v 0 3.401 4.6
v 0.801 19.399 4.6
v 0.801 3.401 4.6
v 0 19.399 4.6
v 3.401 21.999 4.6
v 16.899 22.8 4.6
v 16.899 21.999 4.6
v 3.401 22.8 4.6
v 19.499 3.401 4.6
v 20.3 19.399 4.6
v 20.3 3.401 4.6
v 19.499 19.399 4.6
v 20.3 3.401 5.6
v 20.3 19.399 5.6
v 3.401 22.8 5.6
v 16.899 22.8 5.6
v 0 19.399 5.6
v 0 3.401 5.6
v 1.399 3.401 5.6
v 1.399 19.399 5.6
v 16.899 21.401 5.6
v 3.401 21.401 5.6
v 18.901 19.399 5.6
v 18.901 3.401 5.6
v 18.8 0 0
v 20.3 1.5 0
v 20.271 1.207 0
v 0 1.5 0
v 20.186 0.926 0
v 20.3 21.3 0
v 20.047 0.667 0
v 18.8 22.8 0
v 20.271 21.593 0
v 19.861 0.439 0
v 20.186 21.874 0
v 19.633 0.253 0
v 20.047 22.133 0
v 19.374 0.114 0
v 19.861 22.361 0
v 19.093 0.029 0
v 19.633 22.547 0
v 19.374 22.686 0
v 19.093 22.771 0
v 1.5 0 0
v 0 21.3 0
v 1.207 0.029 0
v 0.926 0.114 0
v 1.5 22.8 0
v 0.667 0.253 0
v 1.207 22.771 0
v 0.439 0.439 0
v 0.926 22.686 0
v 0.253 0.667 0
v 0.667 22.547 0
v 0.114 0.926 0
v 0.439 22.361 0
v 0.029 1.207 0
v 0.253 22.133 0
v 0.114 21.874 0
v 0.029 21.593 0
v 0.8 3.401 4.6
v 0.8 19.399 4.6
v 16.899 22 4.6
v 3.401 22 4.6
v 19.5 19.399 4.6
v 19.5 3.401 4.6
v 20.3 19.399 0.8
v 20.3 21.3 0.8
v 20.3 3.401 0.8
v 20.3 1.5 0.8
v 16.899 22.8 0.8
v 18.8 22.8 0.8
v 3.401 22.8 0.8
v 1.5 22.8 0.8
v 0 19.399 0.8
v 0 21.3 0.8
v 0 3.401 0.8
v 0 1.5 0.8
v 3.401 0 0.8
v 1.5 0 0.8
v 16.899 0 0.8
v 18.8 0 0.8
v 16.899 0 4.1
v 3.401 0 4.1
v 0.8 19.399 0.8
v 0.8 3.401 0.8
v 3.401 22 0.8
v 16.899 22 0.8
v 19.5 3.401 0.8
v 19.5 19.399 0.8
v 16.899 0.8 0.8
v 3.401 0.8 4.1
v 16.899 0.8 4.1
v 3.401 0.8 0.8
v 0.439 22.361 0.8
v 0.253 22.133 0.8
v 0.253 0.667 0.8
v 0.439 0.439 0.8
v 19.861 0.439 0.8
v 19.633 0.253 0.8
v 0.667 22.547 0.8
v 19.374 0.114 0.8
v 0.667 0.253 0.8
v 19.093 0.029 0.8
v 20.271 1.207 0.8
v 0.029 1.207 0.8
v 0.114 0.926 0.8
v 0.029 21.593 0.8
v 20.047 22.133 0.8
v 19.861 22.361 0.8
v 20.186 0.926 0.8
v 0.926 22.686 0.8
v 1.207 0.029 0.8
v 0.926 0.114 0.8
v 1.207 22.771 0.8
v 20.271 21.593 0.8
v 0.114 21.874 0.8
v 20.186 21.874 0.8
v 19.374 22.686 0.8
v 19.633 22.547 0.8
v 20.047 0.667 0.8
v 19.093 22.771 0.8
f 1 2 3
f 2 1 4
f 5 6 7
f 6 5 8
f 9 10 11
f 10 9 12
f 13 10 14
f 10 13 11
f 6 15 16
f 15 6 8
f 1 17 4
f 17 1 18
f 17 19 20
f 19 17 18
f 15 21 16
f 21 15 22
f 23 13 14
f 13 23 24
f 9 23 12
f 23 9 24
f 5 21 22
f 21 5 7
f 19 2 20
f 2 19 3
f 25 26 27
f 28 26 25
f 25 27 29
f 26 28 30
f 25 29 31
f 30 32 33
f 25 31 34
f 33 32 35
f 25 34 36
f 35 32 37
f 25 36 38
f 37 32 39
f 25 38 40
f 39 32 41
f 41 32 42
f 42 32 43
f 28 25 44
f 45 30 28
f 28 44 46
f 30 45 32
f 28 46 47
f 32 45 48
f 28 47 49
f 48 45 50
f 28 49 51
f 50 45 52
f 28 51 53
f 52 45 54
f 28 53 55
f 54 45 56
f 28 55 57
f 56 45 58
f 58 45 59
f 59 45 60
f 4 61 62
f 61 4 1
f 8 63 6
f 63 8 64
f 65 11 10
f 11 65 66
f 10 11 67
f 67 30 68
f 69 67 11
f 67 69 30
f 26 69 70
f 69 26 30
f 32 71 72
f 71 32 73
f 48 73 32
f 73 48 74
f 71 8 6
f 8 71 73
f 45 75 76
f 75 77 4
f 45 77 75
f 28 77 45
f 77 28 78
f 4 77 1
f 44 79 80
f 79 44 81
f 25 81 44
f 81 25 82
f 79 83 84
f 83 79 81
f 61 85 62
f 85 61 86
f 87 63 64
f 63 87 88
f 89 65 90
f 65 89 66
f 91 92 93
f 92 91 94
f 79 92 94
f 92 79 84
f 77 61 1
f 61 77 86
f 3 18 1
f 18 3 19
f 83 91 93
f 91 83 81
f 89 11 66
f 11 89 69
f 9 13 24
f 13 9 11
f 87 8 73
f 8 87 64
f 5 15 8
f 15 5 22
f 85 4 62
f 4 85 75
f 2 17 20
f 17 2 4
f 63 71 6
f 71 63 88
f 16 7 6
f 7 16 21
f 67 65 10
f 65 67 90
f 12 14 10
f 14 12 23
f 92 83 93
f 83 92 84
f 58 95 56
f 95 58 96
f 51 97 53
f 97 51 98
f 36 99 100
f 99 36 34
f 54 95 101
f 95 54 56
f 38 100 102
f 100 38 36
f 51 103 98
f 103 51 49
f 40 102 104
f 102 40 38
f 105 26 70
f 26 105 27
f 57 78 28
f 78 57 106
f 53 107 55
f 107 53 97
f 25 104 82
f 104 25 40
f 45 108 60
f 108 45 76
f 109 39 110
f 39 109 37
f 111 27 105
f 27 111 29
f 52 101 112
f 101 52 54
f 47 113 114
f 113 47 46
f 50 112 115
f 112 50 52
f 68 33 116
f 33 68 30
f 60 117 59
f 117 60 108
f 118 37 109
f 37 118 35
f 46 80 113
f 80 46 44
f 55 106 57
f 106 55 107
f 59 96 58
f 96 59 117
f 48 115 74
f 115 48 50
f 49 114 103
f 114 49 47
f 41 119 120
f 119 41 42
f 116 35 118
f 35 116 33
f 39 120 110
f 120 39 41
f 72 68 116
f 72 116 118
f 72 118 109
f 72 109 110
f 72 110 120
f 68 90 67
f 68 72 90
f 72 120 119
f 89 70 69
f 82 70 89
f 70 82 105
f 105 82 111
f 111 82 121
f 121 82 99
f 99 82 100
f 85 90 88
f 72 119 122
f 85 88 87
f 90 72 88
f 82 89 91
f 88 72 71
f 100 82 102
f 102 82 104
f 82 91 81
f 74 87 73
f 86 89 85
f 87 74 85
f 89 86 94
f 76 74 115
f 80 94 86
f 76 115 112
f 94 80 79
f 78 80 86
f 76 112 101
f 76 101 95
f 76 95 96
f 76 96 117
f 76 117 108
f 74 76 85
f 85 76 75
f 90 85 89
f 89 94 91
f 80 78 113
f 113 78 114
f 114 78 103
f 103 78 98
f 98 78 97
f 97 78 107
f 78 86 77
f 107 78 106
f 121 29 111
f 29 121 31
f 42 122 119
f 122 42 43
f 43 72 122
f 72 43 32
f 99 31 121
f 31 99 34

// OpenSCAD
EPSILON = 0.001;

BLE_NANO_WIDTH = 18.5;
BLE_NANO_DEPTH = 21;
BLE_NANO_PCB_HEIGHT = 1;
PCB_CORNER_RADIUS = 1.5;

FRONT_COMPONENTS_HEIGHT = 1;
BACK_COMPONENTS_HEIGHT = 3;

HOLDER_WALL_THICKNESS = 0.8;
BLE_NANO_MARGIN = 0.1;

function BleNano_width() = BLE_NANO_WIDTH;
function BleNano_depth() = BLE_NANO_DEPTH;
function BleNano_holderWidth() = BLE_NANO_WIDTH + 2 * (HOLDER_WALL_THICKNESS + BLE_NANO_MARGIN);
function BleNano_holderDepth() = BLE_NANO_DEPTH + 2 * (HOLDER_WALL_THICKNESS + BLE_NANO_MARGIN);

/**
 * BLE nano microcontroller.
 *
 * @param positiveShape
 *     if true, draw only the positive part.
 *     if false, draw only the negative part.
 */
module BleNano(baseThickness = 0.8, positiveShape = true) {
    // Base
    baseX = HOLDER_WALL_THICKNESS + BLE_NANO_MARGIN;
    baseY = HOLDER_WALL_THICKNESS + BLE_NANO_MARGIN;
    if (positiveShape) {
        translate([baseX, baseY, BACK_COMPONENTS_HEIGHT + baseThickness])
            linear_extrude(height = BLE_NANO_PCB_HEIGHT)
                offset(r = PCB_CORNER_RADIUS, $fn = 32)
                    offset(r = -PCB_CORNER_RADIUS, $fn = 32)
                        square([BLE_NANO_WIDTH, BLE_NANO_DEPTH]);
    }
    
    // Front components
    if (positiveShape) {
        width = 15;
        depth = 11.5;
        translate([baseX - (width - BLE_NANO_WIDTH) / 2,
                   baseY + 3,
                   BACK_COMPONENTS_HEIGHT + BLE_NANO_PCB_HEIGHT + baseThickness])
            cube([width, depth, FRONT_COMPONENTS_HEIGHT]);
    }
    
    // Back components
    if (positiveShape) {
        width = 15;
        depth = 17.25;
        translate([baseX - (width - BLE_NANO_WIDTH) / 2, baseY + 1, baseThickness])
            cube([width, depth, BACK_COMPONENTS_HEIGHT]);
    }
}

/**
 * BLE nano holder.
 *
 * @param positiveShape
 *     if true, draw only the positive part.
 *     if false, draw only the negative part.
 */
module BleNano_holder(baseThickness = 0.8, positiveShape = true) {
    // Base
    baseWidth = BleNano_holderWidth();
    baseDepth = BleNano_holderDepth();
    if (positiveShape) {
        linear_extrude(height = baseThickness)
            offset(r = PCB_CORNER_RADIUS, $fn = 32)
                offset(r = -PCB_CORNER_RADIUS, $fn = 32)
                    square([baseWidth, baseDepth]);
    }
    
    // Supports
    if (positiveShape) {
        wallHeight = baseThickness + BACK_COMPONENTS_HEIGHT + baseThickness;
        horizontalTopSupportHeight = 1;
        horizontalTopSupportWidth = 0.6;
        innerClearanceWidth = BLE_NANO_WIDTH + 2 * BLE_NANO_MARGIN;
        innerClearanceDepth = BLE_NANO_DEPTH + 2 * BLE_NANO_MARGIN;
        
        difference() {
            union() {
                // Contour around the BLE Nano
                linear_extrude(height = wallHeight)
                    difference() {
                        offset(r = PCB_CORNER_RADIUS, $fn = 32)
                            offset(r = -PCB_CORNER_RADIUS, $fn = 32)
                                square([baseWidth, baseDepth]);
                
                        translate([HOLDER_WALL_THICKNESS, HOLDER_WALL_THICKNESS])
                            offset(r = PCB_CORNER_RADIUS, $fn = 32)
                                offset(r = -PCB_CORNER_RADIUS, $fn = 32)
                                    square([innerClearanceWidth, innerClearanceDepth]);
                    }
                    
                // Horizontal supports on top of the BLE Nano
                translate([0, 0, wallHeight])
                    difference() {
                        linear_extrude(height = horizontalTopSupportHeight)
                            offset(r = PCB_CORNER_RADIUS, $fn = 32)
                                offset(r = -PCB_CORNER_RADIUS, $fn = 32)
                                    square([baseWidth, baseDepth]);
                
                        scale = [(innerClearanceWidth - 2 * horizontalTopSupportWidth) / 
                                 innerClearanceWidth,
                                 (innerClearanceDepth - 2 * horizontalTopSupportWidth) / 
                                 innerClearanceDepth];
                        translate([HOLDER_WALL_THICKNESS, HOLDER_WALL_THICKNESS, -EPSILON])
                            translate([innerClearanceWidth / 2, innerClearanceDepth / 2])
                                linear_extrude(height = horizontalTopSupportHeight + 2 * EPSILON,
                                               scale = scale)
                                    translate([-innerClearanceWidth / 2, -innerClearanceDepth / 2])
                                        offset(r = PCB_CORNER_RADIUS, $fn = 32)
                                            offset(r = -PCB_CORNER_RADIUS, $fn = 32)
                                                square([innerClearanceWidth, innerClearanceDepth]);
                    }
            }
            
            // Remove the support corners
            cornerSize = HOLDER_WALL_THICKNESS + horizontalTopSupportWidth + 2 + 2 * EPSILON;
            cornerheight = wallHeight + horizontalTopSupportHeight + EPSILON;
            for (y = [-EPSILON, baseDepth - cornerSize + EPSILON])
                for (x = [-EPSILON, baseWidth - cornerSize + EPSILON])
                    translate([x, y, 0])
                        cube([cornerSize, cornerSize, cornerheight]);
            
            // Clearance for the surface pins
            translate([-EPSILON, -EPSILON, wallHeight - 0.5])
                cube([baseWidth + 2 * EPSILON,
                      HOLDER_WALL_THICKNESS + horizontalTopSupportWidth + 2 * EPSILON,
                      horizontalTopSupportHeight + 0.5 + EPSILON]);
        }
    }
}
/*
color("red")
    difference() {
        BleNano(0.8, true);
        BleNano(0.8, false);
    }
*/
difference() {
    BleNano_holder(0.8, true);
    BleNano_holder(0.8, false);
}
